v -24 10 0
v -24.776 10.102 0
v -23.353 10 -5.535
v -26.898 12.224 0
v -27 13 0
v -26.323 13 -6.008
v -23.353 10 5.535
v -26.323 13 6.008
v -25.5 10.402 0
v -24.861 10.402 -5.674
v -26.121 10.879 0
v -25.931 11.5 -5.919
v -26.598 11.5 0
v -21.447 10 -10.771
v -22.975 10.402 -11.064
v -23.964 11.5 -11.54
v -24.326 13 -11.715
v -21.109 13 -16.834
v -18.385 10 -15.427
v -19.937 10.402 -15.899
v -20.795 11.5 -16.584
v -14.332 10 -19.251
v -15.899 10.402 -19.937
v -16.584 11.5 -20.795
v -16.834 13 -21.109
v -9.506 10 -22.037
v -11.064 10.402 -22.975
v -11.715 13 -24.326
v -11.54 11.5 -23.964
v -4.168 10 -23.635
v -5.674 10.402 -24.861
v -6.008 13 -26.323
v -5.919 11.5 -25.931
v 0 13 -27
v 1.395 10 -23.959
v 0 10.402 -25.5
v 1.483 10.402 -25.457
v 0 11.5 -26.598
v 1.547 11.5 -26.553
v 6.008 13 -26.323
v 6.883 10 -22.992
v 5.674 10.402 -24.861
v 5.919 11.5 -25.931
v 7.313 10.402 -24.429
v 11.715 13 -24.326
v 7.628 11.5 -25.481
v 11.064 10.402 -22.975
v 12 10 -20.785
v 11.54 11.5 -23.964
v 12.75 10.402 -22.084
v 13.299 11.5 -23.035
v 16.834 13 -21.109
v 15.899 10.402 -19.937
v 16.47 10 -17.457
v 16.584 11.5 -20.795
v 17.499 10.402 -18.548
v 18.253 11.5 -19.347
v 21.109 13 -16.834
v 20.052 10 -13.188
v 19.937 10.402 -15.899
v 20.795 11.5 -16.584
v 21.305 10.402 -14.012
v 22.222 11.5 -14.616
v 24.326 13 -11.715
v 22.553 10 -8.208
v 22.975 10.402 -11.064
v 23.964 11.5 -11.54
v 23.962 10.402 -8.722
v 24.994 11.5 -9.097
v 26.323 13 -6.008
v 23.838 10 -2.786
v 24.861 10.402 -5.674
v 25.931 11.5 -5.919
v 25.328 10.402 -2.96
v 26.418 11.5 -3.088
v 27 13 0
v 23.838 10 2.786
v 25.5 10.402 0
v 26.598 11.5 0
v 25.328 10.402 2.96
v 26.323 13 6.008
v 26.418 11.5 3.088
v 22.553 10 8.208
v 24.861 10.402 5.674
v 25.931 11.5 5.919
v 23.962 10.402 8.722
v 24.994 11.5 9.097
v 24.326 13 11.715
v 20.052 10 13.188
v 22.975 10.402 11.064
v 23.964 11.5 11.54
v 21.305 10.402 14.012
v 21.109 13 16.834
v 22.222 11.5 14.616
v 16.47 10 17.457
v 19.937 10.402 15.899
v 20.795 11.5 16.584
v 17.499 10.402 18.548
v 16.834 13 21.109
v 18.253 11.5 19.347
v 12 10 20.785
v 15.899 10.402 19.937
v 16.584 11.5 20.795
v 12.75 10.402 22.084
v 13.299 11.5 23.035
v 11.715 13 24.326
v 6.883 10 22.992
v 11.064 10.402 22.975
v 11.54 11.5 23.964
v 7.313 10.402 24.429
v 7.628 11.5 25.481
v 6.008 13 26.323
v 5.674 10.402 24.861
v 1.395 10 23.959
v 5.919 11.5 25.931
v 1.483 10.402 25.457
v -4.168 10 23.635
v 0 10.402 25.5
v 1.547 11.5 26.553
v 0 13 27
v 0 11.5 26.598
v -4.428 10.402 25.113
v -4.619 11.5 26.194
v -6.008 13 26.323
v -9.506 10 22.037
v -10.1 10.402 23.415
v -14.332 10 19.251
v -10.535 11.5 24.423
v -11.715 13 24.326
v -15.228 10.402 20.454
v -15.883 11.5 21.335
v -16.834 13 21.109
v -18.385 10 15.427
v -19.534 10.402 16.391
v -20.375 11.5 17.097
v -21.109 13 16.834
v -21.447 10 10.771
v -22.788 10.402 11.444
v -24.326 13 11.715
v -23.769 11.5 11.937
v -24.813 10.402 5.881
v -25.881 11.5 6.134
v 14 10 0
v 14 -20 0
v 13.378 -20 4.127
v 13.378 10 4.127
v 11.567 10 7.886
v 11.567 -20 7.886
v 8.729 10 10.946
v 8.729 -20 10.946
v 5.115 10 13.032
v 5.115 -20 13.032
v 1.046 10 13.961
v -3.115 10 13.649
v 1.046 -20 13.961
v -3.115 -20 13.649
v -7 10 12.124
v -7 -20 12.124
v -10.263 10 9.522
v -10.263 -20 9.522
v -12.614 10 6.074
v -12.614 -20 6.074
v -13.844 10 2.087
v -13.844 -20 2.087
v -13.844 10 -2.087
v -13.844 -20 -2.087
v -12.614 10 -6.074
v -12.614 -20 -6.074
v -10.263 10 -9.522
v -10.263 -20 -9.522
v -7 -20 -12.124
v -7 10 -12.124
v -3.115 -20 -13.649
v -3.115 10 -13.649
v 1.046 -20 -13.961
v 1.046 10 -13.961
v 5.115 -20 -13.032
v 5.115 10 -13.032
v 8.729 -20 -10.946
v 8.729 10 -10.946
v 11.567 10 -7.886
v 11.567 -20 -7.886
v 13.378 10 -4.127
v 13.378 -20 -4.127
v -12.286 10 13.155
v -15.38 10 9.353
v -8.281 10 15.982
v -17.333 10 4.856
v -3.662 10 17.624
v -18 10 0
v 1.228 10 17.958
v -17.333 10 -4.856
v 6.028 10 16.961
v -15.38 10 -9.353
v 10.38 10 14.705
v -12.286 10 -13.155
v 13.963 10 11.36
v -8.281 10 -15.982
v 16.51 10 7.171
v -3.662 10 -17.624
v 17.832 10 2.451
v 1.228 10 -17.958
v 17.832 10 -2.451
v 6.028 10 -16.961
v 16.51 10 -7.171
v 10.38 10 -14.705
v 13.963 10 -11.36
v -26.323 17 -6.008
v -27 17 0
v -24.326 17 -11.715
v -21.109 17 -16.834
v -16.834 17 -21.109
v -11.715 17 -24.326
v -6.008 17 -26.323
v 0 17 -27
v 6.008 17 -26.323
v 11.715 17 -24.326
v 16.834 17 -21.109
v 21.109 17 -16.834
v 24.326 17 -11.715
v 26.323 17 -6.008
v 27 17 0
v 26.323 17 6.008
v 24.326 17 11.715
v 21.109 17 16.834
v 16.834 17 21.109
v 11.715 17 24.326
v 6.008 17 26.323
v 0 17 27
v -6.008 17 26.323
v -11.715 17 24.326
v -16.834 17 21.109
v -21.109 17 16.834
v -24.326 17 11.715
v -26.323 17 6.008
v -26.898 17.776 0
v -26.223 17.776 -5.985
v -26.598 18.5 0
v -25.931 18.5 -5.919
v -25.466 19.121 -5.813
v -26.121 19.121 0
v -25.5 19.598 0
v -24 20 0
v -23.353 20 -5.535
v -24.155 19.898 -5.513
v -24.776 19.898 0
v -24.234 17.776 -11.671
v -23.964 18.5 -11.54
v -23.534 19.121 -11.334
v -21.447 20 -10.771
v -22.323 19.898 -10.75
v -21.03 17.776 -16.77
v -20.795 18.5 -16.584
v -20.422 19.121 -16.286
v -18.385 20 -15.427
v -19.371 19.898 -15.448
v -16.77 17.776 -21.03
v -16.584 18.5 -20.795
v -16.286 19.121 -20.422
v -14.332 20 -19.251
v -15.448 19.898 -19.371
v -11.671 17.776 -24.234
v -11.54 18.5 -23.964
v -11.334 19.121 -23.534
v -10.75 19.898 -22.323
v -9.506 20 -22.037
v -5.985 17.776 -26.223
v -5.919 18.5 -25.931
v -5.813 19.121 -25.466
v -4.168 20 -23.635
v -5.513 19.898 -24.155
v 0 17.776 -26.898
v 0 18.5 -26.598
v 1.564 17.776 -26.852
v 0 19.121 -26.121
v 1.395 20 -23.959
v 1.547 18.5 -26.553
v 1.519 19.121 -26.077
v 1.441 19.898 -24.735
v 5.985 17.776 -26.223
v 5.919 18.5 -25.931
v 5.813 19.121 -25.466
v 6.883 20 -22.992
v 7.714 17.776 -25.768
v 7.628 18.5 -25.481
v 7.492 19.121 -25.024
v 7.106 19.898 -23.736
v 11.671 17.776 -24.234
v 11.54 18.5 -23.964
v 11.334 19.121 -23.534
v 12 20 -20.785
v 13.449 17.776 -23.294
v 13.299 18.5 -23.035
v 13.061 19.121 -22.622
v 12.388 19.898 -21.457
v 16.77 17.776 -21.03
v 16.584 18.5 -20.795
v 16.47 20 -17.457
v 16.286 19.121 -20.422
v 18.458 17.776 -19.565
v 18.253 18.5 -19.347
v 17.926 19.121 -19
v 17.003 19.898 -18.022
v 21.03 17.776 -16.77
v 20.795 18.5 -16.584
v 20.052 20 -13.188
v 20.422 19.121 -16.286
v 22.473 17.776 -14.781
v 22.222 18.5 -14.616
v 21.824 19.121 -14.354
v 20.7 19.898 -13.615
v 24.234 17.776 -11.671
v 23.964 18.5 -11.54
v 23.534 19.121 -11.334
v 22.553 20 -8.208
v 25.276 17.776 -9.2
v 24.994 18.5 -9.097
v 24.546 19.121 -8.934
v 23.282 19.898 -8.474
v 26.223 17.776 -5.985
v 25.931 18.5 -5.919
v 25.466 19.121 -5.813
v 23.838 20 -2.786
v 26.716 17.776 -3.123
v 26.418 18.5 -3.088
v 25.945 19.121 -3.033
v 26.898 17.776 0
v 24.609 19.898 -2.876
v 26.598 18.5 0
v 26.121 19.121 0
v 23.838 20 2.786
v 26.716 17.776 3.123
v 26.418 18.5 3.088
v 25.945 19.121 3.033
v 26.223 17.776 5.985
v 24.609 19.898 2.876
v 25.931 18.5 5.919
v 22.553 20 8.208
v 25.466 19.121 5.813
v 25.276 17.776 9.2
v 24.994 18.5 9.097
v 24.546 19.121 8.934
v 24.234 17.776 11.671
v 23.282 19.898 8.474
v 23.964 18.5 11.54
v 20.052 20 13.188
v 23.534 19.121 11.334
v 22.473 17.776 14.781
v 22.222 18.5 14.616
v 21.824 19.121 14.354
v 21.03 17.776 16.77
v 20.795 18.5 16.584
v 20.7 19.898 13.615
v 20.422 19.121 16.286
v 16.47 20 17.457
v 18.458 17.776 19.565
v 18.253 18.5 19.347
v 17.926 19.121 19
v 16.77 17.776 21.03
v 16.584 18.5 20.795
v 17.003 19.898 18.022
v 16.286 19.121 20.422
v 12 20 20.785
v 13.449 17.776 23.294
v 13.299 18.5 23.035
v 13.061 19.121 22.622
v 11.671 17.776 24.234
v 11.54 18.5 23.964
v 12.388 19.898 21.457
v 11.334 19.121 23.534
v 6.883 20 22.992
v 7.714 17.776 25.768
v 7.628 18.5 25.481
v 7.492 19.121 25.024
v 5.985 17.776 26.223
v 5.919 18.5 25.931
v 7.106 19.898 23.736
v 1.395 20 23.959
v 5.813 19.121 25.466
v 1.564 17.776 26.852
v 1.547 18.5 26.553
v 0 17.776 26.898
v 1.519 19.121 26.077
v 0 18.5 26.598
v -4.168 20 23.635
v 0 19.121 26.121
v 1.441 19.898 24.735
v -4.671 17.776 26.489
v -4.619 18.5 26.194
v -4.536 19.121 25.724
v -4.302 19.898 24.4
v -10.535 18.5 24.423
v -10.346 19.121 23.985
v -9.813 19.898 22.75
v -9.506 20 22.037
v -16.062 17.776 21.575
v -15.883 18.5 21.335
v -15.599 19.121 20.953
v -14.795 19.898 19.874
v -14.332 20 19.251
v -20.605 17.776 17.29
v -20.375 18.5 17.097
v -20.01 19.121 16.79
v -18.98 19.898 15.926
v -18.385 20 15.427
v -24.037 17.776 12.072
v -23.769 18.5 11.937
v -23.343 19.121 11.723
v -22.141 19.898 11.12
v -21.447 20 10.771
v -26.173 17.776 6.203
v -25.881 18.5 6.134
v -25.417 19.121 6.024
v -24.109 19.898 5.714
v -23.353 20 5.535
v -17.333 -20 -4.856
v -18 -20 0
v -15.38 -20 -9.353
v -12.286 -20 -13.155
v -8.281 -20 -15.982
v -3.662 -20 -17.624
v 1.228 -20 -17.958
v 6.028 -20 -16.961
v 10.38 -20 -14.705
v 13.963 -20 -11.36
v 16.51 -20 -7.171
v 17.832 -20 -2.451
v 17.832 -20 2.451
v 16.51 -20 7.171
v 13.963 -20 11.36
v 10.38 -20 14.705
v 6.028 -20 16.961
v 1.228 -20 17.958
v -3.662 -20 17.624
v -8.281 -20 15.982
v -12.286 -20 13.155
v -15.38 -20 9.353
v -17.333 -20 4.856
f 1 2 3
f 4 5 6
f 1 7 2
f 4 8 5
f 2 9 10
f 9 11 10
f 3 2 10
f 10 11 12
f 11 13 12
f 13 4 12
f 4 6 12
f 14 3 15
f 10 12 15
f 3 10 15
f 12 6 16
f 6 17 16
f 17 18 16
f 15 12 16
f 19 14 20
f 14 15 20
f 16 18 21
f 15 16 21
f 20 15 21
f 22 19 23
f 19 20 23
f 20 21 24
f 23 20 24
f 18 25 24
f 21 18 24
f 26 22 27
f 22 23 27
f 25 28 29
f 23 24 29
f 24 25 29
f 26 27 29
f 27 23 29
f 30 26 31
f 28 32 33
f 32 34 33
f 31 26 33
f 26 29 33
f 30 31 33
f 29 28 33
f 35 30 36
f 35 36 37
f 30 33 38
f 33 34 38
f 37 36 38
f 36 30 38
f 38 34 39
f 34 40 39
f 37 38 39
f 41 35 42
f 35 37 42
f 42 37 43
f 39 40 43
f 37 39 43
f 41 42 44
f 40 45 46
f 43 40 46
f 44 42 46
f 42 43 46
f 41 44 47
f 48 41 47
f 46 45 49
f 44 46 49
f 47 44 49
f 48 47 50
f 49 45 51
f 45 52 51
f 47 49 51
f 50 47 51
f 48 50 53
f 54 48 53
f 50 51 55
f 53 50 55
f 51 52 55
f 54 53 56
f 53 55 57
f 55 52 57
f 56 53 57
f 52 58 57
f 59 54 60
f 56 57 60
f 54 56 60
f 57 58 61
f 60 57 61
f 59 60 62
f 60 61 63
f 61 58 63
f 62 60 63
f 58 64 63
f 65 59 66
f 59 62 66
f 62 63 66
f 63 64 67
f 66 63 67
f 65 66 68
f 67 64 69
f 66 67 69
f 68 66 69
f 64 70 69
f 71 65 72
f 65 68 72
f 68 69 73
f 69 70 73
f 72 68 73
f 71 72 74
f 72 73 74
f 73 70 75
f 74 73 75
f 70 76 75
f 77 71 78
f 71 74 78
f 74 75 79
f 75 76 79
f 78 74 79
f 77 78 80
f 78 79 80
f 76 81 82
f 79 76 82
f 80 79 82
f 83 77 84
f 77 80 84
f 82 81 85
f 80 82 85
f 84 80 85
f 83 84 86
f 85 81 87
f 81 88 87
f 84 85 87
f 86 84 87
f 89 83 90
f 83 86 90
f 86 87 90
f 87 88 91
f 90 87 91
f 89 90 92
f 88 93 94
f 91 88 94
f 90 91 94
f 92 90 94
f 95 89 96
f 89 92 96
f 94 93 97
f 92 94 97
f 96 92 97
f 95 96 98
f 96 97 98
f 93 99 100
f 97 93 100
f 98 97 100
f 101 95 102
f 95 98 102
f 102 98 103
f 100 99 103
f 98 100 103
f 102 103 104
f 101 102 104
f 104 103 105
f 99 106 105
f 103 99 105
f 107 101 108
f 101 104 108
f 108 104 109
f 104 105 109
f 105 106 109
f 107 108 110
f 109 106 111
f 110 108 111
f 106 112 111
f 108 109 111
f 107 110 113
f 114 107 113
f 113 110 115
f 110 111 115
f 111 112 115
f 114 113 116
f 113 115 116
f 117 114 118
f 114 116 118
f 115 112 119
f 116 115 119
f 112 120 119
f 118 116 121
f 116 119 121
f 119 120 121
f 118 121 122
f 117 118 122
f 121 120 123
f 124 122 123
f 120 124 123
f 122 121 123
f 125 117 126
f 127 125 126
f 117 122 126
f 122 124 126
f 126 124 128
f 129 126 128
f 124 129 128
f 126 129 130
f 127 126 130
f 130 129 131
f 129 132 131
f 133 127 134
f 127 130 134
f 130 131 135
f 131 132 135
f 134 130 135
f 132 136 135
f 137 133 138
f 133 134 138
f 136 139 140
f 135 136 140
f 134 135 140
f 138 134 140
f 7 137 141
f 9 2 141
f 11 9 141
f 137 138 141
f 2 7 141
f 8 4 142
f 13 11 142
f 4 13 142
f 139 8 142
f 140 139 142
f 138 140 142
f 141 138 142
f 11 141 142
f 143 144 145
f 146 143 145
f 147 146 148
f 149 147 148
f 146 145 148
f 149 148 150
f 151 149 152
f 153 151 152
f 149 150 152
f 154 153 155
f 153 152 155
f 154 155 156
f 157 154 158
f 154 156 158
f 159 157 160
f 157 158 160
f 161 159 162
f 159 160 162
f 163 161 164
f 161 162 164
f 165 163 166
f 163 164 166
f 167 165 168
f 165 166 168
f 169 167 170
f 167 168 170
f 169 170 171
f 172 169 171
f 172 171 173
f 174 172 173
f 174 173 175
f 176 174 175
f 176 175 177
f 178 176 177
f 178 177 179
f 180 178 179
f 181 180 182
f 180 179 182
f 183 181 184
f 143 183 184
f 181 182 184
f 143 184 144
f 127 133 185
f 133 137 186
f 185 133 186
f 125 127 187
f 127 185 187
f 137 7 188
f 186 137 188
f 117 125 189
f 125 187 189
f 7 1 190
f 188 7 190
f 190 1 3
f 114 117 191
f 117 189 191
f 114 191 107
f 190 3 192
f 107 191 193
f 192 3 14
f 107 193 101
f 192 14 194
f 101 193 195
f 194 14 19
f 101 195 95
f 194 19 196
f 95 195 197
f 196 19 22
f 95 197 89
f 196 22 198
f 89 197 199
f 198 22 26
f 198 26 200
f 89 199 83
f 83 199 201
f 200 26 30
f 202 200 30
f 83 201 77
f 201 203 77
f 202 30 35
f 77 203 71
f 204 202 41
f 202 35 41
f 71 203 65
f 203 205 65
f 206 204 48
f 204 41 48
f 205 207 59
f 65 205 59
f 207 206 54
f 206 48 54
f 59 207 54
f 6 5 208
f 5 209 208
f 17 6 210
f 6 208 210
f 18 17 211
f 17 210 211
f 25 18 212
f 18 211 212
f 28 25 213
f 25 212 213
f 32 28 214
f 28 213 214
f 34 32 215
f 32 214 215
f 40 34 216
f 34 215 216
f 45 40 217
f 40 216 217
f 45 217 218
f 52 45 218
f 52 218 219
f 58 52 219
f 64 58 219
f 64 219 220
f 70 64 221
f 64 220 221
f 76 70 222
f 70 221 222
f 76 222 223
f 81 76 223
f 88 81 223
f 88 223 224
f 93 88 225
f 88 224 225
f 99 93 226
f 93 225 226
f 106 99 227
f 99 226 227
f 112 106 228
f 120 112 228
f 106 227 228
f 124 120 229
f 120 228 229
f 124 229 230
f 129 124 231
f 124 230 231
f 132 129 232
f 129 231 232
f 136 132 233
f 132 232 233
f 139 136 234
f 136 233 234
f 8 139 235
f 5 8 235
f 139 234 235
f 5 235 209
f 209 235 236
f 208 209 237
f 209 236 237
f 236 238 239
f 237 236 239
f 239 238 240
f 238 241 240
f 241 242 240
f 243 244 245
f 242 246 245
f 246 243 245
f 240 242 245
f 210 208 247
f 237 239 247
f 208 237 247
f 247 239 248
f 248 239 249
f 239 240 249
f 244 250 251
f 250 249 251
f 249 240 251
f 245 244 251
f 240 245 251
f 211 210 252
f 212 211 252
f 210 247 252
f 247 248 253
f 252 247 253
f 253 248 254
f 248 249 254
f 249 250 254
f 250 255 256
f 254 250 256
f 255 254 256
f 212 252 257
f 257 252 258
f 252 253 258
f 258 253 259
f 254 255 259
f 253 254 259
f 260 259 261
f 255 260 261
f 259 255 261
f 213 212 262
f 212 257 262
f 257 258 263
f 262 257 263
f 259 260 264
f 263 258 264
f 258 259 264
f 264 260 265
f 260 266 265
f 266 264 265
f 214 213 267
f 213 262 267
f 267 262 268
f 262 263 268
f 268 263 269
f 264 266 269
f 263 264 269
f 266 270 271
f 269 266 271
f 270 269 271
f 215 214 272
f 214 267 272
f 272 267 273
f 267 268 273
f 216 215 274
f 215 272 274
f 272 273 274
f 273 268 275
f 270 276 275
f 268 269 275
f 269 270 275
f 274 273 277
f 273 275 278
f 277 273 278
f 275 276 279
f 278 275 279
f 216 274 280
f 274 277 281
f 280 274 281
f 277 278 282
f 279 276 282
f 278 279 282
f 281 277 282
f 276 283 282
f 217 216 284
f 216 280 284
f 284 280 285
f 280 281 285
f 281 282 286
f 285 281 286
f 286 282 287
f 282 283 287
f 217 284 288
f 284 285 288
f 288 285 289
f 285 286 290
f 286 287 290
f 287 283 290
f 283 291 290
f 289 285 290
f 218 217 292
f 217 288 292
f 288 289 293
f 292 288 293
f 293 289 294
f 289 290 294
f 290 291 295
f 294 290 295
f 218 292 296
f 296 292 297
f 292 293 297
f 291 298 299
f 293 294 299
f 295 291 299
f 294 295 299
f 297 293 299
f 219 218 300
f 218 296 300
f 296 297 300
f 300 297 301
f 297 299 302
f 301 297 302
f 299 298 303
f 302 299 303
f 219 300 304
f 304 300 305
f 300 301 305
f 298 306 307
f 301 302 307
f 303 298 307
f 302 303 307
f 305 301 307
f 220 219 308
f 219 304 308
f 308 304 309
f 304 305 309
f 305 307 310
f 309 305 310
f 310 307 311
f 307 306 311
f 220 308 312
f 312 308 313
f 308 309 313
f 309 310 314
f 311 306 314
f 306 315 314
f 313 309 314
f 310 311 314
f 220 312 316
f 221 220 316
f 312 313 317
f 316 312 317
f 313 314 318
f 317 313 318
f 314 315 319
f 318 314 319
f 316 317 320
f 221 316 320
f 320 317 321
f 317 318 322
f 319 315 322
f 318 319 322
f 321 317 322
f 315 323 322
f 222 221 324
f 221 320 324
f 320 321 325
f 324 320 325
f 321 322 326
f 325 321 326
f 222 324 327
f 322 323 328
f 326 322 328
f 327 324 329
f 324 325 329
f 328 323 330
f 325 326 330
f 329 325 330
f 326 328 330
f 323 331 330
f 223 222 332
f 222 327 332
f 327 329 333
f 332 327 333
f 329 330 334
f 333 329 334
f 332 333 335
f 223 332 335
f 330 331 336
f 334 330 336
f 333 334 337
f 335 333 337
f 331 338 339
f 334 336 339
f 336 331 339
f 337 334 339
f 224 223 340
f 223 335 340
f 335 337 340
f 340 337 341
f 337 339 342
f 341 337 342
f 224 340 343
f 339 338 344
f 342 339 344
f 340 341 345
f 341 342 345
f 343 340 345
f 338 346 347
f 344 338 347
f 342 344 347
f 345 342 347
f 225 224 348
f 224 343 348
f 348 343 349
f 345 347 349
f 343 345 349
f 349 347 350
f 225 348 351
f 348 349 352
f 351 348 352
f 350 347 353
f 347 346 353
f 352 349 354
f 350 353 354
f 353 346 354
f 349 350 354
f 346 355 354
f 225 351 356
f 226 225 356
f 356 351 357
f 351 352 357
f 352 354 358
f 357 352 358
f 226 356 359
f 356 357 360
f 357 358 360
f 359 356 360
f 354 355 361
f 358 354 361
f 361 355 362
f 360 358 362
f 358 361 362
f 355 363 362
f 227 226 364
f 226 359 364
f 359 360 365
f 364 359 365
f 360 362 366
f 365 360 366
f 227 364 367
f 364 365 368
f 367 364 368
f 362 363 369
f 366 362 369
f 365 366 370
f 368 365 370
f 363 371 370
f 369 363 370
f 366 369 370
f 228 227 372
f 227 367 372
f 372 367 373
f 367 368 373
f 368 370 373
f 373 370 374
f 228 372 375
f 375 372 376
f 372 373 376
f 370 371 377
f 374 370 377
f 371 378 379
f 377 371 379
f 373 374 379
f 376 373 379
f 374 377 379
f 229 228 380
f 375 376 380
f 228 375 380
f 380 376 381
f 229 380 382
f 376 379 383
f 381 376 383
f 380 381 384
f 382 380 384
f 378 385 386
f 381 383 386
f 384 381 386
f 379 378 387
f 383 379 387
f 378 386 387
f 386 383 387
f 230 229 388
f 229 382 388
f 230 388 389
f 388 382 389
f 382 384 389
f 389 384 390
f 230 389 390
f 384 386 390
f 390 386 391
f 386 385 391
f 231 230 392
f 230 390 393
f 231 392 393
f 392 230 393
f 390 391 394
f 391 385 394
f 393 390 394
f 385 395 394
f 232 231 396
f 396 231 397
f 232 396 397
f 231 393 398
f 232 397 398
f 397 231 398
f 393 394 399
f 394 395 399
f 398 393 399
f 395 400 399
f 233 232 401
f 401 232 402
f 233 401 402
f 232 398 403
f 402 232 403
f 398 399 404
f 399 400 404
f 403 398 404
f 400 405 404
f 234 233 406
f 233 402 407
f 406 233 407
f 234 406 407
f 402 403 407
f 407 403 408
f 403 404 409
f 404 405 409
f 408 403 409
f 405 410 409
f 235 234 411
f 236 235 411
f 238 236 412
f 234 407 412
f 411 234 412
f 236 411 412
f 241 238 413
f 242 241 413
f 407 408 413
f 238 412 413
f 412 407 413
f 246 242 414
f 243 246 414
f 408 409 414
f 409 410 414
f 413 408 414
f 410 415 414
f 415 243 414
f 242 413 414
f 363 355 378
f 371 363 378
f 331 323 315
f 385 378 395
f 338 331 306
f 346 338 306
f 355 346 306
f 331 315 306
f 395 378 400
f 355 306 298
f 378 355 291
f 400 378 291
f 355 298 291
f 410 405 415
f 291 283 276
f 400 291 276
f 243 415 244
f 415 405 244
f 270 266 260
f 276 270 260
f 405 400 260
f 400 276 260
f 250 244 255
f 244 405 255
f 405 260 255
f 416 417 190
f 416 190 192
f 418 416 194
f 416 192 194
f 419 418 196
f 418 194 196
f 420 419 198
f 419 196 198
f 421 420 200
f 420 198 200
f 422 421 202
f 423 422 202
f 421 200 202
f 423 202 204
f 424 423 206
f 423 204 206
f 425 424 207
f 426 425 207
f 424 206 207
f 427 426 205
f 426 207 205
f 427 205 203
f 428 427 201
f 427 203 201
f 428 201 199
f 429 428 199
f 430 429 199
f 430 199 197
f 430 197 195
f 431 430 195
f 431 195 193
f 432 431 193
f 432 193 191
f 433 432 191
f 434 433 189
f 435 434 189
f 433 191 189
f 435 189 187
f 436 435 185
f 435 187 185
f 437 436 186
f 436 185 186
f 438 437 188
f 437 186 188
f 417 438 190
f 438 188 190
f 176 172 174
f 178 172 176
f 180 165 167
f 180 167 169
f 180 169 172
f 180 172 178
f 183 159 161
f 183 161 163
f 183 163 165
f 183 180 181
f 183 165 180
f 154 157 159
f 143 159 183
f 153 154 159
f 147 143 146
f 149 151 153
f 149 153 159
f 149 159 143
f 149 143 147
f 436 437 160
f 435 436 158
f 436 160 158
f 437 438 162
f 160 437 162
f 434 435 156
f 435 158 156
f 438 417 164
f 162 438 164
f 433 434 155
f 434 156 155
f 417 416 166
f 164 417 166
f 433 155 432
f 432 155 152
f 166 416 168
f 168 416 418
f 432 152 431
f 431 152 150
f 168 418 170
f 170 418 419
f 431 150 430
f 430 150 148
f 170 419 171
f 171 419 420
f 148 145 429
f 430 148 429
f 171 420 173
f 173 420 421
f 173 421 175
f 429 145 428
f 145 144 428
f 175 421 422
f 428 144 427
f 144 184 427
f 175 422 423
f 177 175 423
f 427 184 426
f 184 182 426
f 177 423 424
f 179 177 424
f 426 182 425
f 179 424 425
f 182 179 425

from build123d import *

# Parameters (mm, degrees)
SKETCH2_R          = 14
CUT_EXTRUDE1_DEPTH = 30


with BuildPart() as part:
    # Sketch1 → Revolve1 (revolve)
    with BuildSketch(Plane.XY, mode=Mode.PRIVATE) as revolve1_sk:
        with BuildLine():
            Line((0, -20), (18, -20))
            Line((18, -20), (18, 10))
            Line((18, 10), (24, 10))
            ThreePointArc((24, 10), (26.121320344, 10.878679656), (27, 13))
            Line((27, 13), (27, 17))
            ThreePointArc((27, 17), (26.121320344, 19.121320344), (24, 20))
            Line((24, 20), (0, 20))
            Line((0, 20), (0, -20))
        make_face()
    revolve(revolve1_sk.sketch.rotate(Axis((0, 20, 0), (0, -1, 0)), 180), axis=Axis((0, 20, 0), (0, -1, 0)))

    # Sketch2 → Cut-Extrude1 (cut)
    with BuildSketch(Plane.XZ.offset(20)):
        Circle(SKETCH2_R)
    extrude(amount=-CUT_EXTRUDE1_DEPTH, mode=Mode.SUBTRACT)


solid = part.part
